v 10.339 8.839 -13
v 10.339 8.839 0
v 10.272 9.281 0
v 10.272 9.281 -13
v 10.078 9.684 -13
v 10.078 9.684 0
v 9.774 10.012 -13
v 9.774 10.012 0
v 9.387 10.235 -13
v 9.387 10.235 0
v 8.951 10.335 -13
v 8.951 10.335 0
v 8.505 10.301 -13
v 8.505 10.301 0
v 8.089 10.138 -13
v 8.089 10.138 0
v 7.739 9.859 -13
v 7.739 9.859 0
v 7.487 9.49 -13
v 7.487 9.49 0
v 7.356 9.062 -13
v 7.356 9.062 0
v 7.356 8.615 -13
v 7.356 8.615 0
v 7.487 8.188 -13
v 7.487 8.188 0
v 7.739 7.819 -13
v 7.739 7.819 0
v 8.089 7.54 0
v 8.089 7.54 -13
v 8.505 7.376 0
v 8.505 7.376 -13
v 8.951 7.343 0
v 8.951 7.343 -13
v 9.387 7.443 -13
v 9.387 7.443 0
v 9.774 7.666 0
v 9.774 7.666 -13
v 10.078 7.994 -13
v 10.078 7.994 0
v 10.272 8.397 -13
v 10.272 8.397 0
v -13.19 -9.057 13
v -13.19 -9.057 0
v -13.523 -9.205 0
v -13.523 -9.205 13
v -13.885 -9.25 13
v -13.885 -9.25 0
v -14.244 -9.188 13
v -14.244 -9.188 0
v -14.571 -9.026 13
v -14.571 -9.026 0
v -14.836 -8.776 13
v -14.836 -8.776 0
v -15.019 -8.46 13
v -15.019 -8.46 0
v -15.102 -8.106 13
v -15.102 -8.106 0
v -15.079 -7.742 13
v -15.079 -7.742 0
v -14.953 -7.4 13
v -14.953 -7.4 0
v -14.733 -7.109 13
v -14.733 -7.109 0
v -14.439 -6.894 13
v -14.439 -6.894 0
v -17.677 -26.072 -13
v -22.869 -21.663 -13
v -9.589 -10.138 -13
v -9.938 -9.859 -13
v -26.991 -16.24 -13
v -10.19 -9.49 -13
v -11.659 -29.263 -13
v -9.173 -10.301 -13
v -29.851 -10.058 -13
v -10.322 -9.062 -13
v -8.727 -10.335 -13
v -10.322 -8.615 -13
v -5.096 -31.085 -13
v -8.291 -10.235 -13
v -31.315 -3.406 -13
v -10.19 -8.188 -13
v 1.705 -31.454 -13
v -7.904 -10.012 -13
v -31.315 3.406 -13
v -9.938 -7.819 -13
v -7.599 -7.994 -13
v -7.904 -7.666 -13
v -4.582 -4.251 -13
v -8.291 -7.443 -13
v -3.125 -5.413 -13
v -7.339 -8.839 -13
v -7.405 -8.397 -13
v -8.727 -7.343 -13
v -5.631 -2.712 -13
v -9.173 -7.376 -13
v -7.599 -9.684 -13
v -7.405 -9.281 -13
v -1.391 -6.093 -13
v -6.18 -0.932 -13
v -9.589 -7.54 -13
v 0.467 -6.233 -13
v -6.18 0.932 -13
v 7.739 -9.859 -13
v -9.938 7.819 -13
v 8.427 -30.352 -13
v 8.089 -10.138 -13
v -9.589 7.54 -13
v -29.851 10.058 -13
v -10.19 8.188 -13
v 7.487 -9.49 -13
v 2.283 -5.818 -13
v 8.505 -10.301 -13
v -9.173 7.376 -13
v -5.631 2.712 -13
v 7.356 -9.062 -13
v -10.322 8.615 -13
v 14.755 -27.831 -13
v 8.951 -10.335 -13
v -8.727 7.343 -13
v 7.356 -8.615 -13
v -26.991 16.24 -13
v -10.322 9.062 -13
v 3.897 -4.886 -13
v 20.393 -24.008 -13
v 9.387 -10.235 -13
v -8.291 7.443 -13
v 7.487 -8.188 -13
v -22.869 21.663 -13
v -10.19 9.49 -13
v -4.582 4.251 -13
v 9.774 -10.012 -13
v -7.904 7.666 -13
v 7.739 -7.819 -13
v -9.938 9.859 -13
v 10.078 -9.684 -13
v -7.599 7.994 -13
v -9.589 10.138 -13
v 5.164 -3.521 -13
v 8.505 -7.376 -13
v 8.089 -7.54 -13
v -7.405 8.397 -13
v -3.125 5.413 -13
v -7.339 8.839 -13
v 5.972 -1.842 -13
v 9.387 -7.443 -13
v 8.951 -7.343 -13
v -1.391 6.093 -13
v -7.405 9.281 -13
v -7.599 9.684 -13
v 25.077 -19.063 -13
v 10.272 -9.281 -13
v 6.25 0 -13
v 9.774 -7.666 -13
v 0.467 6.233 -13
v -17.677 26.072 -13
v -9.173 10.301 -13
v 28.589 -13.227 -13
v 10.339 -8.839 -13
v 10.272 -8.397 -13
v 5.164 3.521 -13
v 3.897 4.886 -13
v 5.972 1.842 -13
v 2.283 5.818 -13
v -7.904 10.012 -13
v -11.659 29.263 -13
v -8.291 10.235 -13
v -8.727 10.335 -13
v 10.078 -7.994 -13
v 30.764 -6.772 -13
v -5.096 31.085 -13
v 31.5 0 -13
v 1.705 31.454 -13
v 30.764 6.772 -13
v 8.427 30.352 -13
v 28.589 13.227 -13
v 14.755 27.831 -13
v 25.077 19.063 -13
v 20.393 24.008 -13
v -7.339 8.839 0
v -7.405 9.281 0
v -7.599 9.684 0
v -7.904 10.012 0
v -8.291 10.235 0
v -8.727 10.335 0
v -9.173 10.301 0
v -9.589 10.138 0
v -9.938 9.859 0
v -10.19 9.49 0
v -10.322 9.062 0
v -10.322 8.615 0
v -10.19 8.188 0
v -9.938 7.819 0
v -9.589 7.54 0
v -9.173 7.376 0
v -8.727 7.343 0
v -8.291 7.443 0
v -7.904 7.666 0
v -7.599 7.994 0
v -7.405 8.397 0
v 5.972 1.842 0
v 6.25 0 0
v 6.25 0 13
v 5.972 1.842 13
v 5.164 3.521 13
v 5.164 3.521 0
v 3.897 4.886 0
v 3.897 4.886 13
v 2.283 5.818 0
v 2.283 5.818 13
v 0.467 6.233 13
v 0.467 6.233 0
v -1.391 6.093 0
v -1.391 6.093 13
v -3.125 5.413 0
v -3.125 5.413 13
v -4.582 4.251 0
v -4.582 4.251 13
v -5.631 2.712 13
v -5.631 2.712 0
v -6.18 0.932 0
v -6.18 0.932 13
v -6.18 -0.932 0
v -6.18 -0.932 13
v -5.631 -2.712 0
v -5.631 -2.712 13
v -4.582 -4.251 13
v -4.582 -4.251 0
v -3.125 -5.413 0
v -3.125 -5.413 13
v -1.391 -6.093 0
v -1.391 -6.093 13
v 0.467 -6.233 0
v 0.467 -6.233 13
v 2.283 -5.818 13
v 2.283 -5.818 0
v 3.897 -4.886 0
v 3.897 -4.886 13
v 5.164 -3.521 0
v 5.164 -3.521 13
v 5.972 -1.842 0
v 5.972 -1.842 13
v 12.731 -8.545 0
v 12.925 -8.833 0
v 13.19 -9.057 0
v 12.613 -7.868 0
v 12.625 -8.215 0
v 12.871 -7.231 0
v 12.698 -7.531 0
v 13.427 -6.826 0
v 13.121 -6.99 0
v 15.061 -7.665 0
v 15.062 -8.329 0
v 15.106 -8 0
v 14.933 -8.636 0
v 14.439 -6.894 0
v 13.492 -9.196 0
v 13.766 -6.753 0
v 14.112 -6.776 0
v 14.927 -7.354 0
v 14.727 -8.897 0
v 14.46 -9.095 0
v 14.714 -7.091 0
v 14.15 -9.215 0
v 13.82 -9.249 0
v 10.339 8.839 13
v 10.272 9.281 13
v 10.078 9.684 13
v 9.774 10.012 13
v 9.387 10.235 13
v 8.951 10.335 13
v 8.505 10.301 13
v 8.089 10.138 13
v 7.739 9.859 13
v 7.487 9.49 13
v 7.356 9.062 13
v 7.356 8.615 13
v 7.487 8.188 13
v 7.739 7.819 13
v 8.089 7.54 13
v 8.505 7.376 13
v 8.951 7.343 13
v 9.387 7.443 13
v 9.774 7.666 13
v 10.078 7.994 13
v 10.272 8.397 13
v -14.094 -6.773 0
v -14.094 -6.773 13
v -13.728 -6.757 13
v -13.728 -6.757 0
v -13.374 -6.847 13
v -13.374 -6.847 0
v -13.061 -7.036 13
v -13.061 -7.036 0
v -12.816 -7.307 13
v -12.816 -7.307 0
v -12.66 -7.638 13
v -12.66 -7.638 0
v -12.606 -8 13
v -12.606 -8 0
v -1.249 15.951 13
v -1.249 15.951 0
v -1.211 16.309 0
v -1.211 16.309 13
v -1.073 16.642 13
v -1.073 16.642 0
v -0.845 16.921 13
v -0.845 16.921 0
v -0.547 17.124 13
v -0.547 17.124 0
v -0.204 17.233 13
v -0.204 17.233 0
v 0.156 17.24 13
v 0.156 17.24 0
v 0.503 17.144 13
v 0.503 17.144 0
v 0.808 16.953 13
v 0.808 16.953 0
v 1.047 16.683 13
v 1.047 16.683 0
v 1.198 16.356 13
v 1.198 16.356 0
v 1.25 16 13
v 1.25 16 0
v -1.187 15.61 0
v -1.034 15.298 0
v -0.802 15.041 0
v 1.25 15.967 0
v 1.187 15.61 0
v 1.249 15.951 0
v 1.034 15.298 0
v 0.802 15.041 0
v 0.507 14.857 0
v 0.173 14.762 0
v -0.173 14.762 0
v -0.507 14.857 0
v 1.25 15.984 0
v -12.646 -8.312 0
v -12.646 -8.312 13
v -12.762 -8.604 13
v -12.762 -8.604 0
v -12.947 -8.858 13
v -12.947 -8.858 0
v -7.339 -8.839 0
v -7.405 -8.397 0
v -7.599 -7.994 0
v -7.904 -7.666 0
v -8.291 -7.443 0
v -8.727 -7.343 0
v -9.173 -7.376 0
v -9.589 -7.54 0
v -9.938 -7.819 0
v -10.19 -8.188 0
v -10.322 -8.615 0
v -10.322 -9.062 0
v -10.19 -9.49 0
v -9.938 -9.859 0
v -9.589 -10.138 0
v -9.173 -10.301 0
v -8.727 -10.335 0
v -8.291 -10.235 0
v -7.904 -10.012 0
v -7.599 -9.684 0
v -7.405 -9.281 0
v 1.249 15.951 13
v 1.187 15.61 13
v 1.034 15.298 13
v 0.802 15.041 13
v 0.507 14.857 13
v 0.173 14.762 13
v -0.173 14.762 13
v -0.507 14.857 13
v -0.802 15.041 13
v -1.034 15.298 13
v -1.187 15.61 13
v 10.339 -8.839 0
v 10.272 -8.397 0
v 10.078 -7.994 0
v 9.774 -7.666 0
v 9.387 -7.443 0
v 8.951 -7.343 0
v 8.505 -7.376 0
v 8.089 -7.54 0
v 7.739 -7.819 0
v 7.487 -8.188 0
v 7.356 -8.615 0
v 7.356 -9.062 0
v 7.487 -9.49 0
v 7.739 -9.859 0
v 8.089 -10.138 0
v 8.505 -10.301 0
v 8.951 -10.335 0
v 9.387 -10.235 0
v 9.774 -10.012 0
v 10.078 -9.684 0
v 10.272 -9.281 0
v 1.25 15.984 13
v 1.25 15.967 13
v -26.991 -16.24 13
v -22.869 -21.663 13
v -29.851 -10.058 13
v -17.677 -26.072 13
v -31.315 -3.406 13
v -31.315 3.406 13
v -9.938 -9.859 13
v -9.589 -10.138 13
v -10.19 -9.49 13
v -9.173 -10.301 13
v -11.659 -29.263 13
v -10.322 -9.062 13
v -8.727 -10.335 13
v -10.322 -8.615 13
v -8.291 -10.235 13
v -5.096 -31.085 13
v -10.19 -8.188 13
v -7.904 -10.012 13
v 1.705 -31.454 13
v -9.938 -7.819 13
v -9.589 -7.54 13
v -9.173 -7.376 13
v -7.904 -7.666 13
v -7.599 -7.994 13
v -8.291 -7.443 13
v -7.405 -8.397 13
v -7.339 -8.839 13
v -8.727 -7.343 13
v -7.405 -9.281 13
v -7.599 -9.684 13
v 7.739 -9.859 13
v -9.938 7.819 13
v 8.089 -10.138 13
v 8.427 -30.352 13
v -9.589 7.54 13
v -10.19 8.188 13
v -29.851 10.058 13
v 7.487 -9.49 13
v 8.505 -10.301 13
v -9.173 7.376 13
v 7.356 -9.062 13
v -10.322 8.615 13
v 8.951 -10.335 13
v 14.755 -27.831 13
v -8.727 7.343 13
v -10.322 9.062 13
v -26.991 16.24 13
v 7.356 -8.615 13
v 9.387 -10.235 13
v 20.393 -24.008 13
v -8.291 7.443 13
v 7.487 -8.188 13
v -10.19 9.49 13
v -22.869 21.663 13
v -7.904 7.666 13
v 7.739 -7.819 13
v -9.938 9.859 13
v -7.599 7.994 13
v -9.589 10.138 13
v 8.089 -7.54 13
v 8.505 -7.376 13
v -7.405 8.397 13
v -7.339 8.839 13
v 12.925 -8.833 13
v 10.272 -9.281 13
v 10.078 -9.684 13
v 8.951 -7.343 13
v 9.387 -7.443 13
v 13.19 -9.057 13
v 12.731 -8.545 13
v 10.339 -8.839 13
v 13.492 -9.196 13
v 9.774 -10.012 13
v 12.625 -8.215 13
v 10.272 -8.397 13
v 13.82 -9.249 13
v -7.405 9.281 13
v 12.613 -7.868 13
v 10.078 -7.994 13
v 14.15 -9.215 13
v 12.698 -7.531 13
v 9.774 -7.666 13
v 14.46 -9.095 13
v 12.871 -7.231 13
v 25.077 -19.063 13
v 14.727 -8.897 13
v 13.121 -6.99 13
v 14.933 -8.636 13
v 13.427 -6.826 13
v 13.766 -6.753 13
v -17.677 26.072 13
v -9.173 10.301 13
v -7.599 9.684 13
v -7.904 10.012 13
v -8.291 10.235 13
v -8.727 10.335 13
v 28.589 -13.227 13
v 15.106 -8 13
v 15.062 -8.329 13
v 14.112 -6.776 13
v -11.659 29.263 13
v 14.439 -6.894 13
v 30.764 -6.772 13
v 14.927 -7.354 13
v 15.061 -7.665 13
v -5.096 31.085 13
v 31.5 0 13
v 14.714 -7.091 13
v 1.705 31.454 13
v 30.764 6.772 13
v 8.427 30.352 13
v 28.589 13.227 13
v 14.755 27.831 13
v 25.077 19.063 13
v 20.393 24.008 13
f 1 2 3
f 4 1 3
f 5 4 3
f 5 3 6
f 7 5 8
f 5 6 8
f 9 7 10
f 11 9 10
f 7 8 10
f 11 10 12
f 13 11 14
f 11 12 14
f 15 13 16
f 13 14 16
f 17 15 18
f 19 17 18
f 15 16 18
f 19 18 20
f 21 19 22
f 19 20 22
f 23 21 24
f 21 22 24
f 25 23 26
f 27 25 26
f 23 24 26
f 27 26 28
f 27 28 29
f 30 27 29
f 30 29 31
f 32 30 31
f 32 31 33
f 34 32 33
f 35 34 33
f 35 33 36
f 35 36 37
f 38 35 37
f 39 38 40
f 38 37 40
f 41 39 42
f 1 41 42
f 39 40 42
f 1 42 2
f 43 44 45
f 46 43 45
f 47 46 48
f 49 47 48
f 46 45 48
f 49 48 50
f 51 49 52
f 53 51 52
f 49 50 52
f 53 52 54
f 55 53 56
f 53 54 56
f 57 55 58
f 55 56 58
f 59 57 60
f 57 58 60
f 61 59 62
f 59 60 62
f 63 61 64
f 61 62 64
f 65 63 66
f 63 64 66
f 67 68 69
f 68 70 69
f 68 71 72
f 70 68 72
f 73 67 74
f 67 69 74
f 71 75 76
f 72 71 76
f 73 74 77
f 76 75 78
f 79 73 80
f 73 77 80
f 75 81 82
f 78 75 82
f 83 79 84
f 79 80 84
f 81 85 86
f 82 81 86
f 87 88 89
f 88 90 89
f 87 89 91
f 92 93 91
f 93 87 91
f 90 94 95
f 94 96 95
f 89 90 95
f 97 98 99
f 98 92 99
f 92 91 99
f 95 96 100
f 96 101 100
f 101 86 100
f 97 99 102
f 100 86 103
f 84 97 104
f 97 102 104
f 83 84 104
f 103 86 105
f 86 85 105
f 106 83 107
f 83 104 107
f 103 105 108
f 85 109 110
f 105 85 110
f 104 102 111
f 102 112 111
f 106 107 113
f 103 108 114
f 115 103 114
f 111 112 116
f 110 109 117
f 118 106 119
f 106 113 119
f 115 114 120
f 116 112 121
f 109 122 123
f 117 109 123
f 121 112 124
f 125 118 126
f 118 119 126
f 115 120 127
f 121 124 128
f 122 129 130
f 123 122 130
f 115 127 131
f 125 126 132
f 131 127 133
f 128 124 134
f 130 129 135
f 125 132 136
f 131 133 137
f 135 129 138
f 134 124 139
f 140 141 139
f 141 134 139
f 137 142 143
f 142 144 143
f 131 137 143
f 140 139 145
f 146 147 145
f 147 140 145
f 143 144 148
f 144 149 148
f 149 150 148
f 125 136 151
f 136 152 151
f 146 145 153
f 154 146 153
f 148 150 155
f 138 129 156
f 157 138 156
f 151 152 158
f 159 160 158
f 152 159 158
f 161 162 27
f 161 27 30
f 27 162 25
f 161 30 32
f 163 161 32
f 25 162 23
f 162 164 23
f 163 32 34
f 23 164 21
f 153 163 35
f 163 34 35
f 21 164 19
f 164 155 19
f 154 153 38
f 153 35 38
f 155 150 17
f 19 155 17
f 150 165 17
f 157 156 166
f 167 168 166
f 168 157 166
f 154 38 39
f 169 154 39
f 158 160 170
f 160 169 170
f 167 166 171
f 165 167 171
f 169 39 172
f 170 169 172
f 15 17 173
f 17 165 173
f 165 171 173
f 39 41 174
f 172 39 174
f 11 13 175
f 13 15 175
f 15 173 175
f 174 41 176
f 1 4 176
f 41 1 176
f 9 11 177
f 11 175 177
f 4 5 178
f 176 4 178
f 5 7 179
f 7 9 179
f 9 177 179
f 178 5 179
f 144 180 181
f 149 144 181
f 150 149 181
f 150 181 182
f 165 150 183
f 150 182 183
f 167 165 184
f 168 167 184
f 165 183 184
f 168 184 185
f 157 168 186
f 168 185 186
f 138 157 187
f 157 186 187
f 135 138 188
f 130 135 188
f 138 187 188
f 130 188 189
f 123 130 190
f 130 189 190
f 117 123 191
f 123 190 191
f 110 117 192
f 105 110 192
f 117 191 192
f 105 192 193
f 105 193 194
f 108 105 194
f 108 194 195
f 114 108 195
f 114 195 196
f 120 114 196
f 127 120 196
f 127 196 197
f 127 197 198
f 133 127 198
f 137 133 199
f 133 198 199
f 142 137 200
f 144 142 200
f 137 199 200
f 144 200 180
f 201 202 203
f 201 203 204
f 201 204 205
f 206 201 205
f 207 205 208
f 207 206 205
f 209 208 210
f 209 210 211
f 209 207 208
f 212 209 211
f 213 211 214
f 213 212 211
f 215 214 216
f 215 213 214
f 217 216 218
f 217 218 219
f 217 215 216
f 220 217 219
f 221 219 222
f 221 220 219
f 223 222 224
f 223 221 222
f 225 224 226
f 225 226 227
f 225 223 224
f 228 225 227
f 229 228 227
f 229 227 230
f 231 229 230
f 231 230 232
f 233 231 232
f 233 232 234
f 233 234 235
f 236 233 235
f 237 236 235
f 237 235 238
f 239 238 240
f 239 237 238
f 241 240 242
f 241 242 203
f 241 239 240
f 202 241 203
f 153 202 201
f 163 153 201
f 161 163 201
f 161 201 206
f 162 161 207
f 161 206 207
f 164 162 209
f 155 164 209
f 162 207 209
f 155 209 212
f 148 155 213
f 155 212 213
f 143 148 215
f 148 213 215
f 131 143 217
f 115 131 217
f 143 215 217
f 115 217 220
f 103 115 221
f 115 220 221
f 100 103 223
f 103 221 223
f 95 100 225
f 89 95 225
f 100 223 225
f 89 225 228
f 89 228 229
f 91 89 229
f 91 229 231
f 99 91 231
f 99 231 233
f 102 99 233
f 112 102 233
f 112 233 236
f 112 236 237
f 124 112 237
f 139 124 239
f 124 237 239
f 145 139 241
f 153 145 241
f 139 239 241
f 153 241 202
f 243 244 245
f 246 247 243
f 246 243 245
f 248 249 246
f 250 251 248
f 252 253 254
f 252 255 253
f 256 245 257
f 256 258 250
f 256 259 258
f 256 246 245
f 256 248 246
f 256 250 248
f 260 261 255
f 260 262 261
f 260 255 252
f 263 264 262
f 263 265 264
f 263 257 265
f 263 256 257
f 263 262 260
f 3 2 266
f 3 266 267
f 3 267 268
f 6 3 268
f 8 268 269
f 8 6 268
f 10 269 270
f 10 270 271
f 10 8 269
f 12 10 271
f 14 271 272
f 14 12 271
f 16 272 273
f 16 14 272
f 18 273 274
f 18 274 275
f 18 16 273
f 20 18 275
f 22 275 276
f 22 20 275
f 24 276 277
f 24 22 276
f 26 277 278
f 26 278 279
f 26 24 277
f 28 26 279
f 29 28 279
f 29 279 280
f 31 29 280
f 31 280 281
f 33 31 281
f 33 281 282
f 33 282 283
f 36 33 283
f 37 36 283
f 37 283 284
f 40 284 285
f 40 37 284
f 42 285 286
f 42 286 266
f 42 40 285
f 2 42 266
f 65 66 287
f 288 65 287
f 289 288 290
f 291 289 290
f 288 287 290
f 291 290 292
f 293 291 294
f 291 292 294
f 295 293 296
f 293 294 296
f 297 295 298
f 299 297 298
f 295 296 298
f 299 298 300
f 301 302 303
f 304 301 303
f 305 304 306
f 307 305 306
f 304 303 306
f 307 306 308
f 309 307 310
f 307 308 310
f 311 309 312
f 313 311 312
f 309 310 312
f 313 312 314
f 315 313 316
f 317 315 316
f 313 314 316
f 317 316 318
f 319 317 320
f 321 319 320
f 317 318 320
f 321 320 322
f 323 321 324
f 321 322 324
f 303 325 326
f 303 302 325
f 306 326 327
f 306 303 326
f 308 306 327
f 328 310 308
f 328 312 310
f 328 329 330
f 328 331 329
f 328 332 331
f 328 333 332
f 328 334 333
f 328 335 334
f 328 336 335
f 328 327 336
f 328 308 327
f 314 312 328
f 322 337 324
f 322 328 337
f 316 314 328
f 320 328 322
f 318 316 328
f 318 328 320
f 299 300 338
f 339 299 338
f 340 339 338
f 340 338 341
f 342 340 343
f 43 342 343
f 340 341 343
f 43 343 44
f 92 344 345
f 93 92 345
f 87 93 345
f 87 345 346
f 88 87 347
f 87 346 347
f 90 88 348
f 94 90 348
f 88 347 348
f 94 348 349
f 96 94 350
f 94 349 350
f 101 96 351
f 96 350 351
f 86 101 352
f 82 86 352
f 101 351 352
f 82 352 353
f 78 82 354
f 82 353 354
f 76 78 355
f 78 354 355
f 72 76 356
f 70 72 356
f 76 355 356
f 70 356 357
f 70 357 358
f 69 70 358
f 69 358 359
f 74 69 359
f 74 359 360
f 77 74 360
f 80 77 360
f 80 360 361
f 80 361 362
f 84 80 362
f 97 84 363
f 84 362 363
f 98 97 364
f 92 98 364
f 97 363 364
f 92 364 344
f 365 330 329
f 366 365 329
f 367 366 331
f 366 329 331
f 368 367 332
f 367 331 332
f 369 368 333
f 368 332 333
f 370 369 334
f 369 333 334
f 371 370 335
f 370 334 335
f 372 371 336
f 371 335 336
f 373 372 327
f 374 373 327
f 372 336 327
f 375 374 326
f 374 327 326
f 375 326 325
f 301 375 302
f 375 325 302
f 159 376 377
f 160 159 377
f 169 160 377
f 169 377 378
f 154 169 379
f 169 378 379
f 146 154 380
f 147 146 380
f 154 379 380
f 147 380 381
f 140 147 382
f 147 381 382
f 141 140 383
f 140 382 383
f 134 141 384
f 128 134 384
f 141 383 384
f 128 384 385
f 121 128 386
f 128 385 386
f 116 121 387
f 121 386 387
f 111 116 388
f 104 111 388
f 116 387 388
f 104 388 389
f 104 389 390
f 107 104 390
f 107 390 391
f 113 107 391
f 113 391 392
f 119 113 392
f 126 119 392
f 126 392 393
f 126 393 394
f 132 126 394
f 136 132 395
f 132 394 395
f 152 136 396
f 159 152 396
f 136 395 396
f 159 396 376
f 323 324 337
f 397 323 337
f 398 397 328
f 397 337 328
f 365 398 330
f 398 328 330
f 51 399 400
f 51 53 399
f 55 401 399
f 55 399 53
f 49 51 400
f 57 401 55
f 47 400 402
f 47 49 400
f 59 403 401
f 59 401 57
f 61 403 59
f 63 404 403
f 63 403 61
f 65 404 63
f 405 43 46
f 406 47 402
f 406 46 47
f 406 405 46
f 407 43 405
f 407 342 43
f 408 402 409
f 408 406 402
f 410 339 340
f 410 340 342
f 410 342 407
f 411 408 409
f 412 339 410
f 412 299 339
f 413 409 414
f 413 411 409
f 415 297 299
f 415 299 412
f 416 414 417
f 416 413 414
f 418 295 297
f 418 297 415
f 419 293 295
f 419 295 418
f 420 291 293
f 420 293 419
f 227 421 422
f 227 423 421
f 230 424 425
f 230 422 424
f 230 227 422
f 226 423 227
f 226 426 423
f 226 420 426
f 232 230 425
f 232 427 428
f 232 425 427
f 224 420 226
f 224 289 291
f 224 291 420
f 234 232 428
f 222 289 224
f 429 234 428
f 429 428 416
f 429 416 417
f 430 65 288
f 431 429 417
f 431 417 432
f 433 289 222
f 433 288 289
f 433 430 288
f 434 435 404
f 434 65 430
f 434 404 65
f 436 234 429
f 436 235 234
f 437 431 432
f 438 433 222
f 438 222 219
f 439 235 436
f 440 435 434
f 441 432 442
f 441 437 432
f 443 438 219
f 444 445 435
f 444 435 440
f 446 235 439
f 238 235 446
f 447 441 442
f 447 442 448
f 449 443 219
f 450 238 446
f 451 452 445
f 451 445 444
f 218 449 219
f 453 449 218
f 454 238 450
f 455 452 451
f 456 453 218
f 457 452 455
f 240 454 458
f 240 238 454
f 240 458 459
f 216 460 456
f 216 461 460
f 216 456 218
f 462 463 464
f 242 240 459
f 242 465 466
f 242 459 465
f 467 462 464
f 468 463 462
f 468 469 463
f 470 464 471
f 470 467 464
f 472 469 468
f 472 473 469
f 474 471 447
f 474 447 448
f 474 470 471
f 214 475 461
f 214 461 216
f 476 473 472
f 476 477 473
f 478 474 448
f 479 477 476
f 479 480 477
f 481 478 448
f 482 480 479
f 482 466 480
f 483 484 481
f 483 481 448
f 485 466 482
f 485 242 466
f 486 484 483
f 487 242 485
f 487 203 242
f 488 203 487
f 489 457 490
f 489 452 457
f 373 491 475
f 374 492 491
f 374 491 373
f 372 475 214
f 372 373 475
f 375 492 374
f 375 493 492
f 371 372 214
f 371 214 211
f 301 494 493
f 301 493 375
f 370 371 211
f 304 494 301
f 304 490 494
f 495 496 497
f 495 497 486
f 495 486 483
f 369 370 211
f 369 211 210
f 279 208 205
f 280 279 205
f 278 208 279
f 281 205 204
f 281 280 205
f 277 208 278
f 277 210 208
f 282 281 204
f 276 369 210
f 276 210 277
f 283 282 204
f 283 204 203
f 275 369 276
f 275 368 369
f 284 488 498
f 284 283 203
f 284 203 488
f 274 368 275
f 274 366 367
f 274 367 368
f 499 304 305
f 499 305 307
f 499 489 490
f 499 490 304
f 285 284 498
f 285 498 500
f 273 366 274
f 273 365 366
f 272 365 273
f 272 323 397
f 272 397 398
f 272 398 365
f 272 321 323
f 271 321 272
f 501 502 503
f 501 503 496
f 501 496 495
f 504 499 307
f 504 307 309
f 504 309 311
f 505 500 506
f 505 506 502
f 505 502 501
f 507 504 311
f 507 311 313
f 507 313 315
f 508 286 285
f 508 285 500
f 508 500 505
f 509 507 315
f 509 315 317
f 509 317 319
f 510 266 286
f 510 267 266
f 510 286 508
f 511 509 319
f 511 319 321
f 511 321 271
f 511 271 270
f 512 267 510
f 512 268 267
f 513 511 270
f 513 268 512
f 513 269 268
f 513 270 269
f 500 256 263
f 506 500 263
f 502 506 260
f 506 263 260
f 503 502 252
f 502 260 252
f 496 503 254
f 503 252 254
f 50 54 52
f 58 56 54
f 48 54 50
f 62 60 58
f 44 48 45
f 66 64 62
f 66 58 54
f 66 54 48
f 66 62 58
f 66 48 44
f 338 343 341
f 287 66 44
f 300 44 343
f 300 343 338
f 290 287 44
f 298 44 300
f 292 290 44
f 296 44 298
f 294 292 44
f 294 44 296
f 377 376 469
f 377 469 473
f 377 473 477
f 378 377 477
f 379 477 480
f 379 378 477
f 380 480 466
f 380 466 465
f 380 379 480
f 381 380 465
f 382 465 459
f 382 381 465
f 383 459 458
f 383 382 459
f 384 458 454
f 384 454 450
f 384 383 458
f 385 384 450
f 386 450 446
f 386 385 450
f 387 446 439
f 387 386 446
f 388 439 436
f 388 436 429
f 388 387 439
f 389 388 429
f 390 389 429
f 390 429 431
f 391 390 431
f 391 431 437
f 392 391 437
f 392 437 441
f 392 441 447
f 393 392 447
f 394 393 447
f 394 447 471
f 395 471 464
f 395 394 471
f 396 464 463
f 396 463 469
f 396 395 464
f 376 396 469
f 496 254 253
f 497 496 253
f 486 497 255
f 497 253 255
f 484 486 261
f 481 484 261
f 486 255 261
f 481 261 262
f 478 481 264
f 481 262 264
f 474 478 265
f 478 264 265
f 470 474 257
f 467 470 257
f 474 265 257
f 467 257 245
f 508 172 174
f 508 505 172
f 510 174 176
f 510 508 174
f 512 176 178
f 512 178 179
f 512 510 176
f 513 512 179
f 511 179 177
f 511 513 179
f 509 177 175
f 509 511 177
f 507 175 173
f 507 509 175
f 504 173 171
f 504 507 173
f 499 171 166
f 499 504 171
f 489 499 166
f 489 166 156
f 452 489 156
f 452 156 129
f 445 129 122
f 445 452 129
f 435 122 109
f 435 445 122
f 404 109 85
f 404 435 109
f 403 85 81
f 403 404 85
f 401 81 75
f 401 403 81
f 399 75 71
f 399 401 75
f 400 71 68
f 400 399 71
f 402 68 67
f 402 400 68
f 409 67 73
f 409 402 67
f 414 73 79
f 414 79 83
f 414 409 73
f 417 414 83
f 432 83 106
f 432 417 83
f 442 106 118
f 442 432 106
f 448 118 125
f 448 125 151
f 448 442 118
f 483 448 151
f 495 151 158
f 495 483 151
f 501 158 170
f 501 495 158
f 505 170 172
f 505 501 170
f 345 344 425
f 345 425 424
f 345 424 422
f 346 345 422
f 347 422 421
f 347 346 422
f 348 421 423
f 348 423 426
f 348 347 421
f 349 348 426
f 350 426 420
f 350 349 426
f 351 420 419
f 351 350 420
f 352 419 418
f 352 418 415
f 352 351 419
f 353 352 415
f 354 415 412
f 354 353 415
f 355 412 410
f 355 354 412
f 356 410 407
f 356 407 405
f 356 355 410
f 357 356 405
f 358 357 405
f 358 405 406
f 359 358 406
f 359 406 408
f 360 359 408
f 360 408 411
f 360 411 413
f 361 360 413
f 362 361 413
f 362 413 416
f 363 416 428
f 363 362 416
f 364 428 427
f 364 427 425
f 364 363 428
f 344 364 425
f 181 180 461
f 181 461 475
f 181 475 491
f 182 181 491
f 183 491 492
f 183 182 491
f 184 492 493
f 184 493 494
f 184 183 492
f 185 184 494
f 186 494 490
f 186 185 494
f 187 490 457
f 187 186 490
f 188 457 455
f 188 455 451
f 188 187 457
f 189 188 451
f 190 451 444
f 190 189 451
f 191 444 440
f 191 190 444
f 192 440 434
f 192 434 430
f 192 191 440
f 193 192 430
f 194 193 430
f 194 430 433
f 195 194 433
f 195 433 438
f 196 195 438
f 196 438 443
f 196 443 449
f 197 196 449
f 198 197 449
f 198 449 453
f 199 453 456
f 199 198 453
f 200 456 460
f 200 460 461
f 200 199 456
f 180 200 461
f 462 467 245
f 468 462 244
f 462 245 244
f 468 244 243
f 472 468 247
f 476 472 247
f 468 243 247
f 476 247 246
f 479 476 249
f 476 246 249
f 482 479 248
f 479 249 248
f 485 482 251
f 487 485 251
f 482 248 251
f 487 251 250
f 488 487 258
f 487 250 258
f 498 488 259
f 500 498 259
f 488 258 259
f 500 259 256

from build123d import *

# Parameters (mm, degrees)
F0_R     = 31.5
F0_R_2   = 1.5
F0_R_3   = 6.25
F1_DEPTH = 13
F2_DEPTH = 13


# Not quite as in the source:
# - a feature names something its author has since deleted; it is built from what else it names


with BuildPart() as f1:
    # F0 (on Top) → F1 (new body)
    with BuildSketch(Plane.XY):
        Circle(F0_R)
        with BuildLine():
            ThreePointArc((1.2490459616, 15.951171875), (11.7470152674, 10.8631317909), (16, 0))
            ThreePointArc((16, 0), (15.6047795357, -3.5342404619), (14.4386430447, -6.8938804043))
            ThreePointArc((14.4386430447, -6.8938804043), (14.9265222791, -7.3539720324), (15.1064064606, -8))
            ThreePointArc((15.1064064606, -8), (14.4601399606, -9.0945345408), (13.1895970831, -9.0572914707))
            ThreePointArc((13.1895970831, -9.0572914707), (0, -16), (-13.1895970831, -9.0572914707))
            ThreePointArc((-13.1895970831, -9.0572914707), (-14.9389382153, -8.625), (-14.4386430447, -6.8938804043))
            ThreePointArc((-14.4386430447, -6.8938804043), (-13.8564064606, 8), (-1.2490459616, 15.951171875))
            ThreePointArc((-1.2490459616, 15.951171875), (-0.0244187222, 17.2497614676), (1.25, 16))
            ThreePointArc((1.25, 16), (1.2497614676, 15.9755812778), (1.2490459616, 15.951171875))
        make_face(mode=Mode.SUBTRACT)
        with BuildLine():
            ThreePointArc((14.4386430447, -6.8938804043), (15.6047795357, -3.5342404619), (16, 0))
            ThreePointArc((16, 0), (11.7470152674, 10.8631317909), (1.2490459616, 15.951171875))
            ThreePointArc((1.2490459616, 15.951171875), (0, 14.75), (-1.2490459616, 15.951171875))
            ThreePointArc((-1.2490459616, 15.951171875), (-13.8564064606, 8), (-14.4386430447, -6.8938804043))
            ThreePointArc((-14.4386430447, -6.8938804043), (-13.210378493, -6.9298841815), (-12.6064064606, -8))
            ThreePointArc((-12.6064064606, -8), (-12.7618719198, -8.6037335), (-13.1895970831, -9.0572914707))
            ThreePointArc((-13.1895970831, -9.0572914707), (0, -16), (13.1895970831, -9.0572914707))
            ThreePointArc((13.1895970831, -9.0572914707), (12.7738747058, -7.375), (14.4386430447, -6.8938804043))
        make_face()
        with Locations((-8.8388347648, -8.8388347648)):
            Circle(F0_R_2, mode=Mode.SUBTRACT)
        with Locations((8.8388347648, -8.8388347648)):
            Circle(F0_R_2, mode=Mode.SUBTRACT)
        with Locations((-8.8388347648, 8.8388347648)):
            Circle(F0_R_2, mode=Mode.SUBTRACT)
        Circle(F0_R_3, mode=Mode.SUBTRACT)
        with Locations((8.8388347648, 8.8388347648)):
            Circle(F0_R_2, mode=Mode.SUBTRACT)
    extrude(amount=F1_DEPTH)

    # F0 (on Top) → F2 (join)
    with BuildSketch(Plane.XY):
        Circle(F0_R)
        with BuildLine():
            ThreePointArc((1.2490459616, 15.951171875), (11.7470152674, 10.8631317909), (16, 0))
            ThreePointArc((16, 0), (15.6047795357, -3.5342404619), (14.4386430447, -6.8938804043))
            ThreePointArc((14.4386430447, -6.8938804043), (14.9265222791, -7.3539720324), (15.1064064606, -8))
            ThreePointArc((15.1064064606, -8), (14.4601399606, -9.0945345408), (13.1895970831, -9.0572914707))
            ThreePointArc((13.1895970831, -9.0572914707), (0, -16), (-13.1895970831, -9.0572914707))
            ThreePointArc((-13.1895970831, -9.0572914707), (-14.9389382153, -8.625), (-14.4386430447, -6.8938804043))
            ThreePointArc((-14.4386430447, -6.8938804043), (-13.8564064606, 8), (-1.2490459616, 15.951171875))
            ThreePointArc((-1.2490459616, 15.951171875), (-0.0244187222, 17.2497614676), (1.25, 16))
            ThreePointArc((1.25, 16), (1.2497614676, 15.9755812778), (1.2490459616, 15.951171875))
        make_face(mode=Mode.SUBTRACT)
        with BuildLine():
            ThreePointArc((14.4386430447, -6.8938804043), (15.6047795357, -3.5342404619), (16, 0))
            ThreePointArc((16, 0), (11.7470152674, 10.8631317909), (1.2490459616, 15.951171875))
            ThreePointArc((1.2490459616, 15.951171875), (0, 14.75), (-1.2490459616, 15.951171875))
            ThreePointArc((-1.2490459616, 15.951171875), (-13.8564064606, 8), (-14.4386430447, -6.8938804043))
            ThreePointArc((-14.4386430447, -6.8938804043), (-13.210378493, -6.9298841815), (-12.6064064606, -8))
            ThreePointArc((-12.6064064606, -8), (-12.7618719198, -8.6037335), (-13.1895970831, -9.0572914707))
            ThreePointArc((-13.1895970831, -9.0572914707), (0, -16), (13.1895970831, -9.0572914707))
            ThreePointArc((13.1895970831, -9.0572914707), (12.7738747058, -7.375), (14.4386430447, -6.8938804043))
        make_face()
        with Locations((-8.8388347648, -8.8388347648)):
            Circle(F0_R_2, mode=Mode.SUBTRACT)
        with Locations((8.8388347648, -8.8388347648)):
            Circle(F0_R_2, mode=Mode.SUBTRACT)
        with Locations((-8.8388347648, 8.8388347648)):
            Circle(F0_R_2, mode=Mode.SUBTRACT)
        Circle(F0_R_3, mode=Mode.SUBTRACT)
        with Locations((8.8388347648, 8.8388347648)):
            Circle(F0_R_2, mode=Mode.SUBTRACT)
        with BuildLine():
            ThreePointArc((-1.2490459616, 15.951171875), (0, 14.75), (1.2490459616, 15.951171875))
            ThreePointArc((1.2490459616, 15.951171875), (0, 16), (-1.2490459616, 15.951171875))
        make_face()
        with BuildLine():
            ThreePointArc((-1.2490459616, 15.951171875), (0, 16), (1.2490459616, 15.951171875))
            ThreePointArc((1.2490459616, 15.951171875), (1.2497614676, 15.9755812778), (1.25, 16))
            ThreePointArc((1.25, 16), (-0.0244187222, 17.2497614676), (-1.2490459616, 15.951171875))
        make_face()
        with BuildLine():
            ThreePointArc((15.1064064606, -8), (14.9265222791, -7.3539720324), (14.4386430447, -6.8938804043))
            ThreePointArc((14.4386430447, -6.8938804043), (13.8564064606, -8), (13.1895970831, -9.0572914707))
            ThreePointArc((13.1895970831, -9.0572914707), (14.4601399606, -9.0945345408), (15.1064064606, -8))
        make_face()
        with BuildLine():
            ThreePointArc((13.1895970831, -9.0572914707), (13.8564064606, -8), (14.4386430447, -6.8938804043))
            ThreePointArc((14.4386430447, -6.8938804043), (12.7738747058, -7.375), (13.1895970831, -9.0572914707))
        make_face()
        with BuildLine():
            ThreePointArc((-12.6064064606, -8), (-13.210378493, -6.9298841815), (-14.4386430447, -6.8938804043))
            ThreePointArc((-14.4386430447, -6.8938804043), (-13.8564064606, -8), (-13.1895970831, -9.0572914707))
            ThreePointArc((-13.1895970831, -9.0572914707), (-12.7618719198, -8.6037335), (-12.6064064606, -8))
        make_face()
        with BuildLine():
            ThreePointArc((-13.1895970831, -9.0572914707), (-13.8564064606, -8), (-14.4386430447, -6.8938804043))
            ThreePointArc((-14.4386430447, -6.8938804043), (-14.9389382153, -8.625), (-13.1895970831, -9.0572914707))
        make_face()
    extrude(amount=-F2_DEPTH)


solid = f1.part
